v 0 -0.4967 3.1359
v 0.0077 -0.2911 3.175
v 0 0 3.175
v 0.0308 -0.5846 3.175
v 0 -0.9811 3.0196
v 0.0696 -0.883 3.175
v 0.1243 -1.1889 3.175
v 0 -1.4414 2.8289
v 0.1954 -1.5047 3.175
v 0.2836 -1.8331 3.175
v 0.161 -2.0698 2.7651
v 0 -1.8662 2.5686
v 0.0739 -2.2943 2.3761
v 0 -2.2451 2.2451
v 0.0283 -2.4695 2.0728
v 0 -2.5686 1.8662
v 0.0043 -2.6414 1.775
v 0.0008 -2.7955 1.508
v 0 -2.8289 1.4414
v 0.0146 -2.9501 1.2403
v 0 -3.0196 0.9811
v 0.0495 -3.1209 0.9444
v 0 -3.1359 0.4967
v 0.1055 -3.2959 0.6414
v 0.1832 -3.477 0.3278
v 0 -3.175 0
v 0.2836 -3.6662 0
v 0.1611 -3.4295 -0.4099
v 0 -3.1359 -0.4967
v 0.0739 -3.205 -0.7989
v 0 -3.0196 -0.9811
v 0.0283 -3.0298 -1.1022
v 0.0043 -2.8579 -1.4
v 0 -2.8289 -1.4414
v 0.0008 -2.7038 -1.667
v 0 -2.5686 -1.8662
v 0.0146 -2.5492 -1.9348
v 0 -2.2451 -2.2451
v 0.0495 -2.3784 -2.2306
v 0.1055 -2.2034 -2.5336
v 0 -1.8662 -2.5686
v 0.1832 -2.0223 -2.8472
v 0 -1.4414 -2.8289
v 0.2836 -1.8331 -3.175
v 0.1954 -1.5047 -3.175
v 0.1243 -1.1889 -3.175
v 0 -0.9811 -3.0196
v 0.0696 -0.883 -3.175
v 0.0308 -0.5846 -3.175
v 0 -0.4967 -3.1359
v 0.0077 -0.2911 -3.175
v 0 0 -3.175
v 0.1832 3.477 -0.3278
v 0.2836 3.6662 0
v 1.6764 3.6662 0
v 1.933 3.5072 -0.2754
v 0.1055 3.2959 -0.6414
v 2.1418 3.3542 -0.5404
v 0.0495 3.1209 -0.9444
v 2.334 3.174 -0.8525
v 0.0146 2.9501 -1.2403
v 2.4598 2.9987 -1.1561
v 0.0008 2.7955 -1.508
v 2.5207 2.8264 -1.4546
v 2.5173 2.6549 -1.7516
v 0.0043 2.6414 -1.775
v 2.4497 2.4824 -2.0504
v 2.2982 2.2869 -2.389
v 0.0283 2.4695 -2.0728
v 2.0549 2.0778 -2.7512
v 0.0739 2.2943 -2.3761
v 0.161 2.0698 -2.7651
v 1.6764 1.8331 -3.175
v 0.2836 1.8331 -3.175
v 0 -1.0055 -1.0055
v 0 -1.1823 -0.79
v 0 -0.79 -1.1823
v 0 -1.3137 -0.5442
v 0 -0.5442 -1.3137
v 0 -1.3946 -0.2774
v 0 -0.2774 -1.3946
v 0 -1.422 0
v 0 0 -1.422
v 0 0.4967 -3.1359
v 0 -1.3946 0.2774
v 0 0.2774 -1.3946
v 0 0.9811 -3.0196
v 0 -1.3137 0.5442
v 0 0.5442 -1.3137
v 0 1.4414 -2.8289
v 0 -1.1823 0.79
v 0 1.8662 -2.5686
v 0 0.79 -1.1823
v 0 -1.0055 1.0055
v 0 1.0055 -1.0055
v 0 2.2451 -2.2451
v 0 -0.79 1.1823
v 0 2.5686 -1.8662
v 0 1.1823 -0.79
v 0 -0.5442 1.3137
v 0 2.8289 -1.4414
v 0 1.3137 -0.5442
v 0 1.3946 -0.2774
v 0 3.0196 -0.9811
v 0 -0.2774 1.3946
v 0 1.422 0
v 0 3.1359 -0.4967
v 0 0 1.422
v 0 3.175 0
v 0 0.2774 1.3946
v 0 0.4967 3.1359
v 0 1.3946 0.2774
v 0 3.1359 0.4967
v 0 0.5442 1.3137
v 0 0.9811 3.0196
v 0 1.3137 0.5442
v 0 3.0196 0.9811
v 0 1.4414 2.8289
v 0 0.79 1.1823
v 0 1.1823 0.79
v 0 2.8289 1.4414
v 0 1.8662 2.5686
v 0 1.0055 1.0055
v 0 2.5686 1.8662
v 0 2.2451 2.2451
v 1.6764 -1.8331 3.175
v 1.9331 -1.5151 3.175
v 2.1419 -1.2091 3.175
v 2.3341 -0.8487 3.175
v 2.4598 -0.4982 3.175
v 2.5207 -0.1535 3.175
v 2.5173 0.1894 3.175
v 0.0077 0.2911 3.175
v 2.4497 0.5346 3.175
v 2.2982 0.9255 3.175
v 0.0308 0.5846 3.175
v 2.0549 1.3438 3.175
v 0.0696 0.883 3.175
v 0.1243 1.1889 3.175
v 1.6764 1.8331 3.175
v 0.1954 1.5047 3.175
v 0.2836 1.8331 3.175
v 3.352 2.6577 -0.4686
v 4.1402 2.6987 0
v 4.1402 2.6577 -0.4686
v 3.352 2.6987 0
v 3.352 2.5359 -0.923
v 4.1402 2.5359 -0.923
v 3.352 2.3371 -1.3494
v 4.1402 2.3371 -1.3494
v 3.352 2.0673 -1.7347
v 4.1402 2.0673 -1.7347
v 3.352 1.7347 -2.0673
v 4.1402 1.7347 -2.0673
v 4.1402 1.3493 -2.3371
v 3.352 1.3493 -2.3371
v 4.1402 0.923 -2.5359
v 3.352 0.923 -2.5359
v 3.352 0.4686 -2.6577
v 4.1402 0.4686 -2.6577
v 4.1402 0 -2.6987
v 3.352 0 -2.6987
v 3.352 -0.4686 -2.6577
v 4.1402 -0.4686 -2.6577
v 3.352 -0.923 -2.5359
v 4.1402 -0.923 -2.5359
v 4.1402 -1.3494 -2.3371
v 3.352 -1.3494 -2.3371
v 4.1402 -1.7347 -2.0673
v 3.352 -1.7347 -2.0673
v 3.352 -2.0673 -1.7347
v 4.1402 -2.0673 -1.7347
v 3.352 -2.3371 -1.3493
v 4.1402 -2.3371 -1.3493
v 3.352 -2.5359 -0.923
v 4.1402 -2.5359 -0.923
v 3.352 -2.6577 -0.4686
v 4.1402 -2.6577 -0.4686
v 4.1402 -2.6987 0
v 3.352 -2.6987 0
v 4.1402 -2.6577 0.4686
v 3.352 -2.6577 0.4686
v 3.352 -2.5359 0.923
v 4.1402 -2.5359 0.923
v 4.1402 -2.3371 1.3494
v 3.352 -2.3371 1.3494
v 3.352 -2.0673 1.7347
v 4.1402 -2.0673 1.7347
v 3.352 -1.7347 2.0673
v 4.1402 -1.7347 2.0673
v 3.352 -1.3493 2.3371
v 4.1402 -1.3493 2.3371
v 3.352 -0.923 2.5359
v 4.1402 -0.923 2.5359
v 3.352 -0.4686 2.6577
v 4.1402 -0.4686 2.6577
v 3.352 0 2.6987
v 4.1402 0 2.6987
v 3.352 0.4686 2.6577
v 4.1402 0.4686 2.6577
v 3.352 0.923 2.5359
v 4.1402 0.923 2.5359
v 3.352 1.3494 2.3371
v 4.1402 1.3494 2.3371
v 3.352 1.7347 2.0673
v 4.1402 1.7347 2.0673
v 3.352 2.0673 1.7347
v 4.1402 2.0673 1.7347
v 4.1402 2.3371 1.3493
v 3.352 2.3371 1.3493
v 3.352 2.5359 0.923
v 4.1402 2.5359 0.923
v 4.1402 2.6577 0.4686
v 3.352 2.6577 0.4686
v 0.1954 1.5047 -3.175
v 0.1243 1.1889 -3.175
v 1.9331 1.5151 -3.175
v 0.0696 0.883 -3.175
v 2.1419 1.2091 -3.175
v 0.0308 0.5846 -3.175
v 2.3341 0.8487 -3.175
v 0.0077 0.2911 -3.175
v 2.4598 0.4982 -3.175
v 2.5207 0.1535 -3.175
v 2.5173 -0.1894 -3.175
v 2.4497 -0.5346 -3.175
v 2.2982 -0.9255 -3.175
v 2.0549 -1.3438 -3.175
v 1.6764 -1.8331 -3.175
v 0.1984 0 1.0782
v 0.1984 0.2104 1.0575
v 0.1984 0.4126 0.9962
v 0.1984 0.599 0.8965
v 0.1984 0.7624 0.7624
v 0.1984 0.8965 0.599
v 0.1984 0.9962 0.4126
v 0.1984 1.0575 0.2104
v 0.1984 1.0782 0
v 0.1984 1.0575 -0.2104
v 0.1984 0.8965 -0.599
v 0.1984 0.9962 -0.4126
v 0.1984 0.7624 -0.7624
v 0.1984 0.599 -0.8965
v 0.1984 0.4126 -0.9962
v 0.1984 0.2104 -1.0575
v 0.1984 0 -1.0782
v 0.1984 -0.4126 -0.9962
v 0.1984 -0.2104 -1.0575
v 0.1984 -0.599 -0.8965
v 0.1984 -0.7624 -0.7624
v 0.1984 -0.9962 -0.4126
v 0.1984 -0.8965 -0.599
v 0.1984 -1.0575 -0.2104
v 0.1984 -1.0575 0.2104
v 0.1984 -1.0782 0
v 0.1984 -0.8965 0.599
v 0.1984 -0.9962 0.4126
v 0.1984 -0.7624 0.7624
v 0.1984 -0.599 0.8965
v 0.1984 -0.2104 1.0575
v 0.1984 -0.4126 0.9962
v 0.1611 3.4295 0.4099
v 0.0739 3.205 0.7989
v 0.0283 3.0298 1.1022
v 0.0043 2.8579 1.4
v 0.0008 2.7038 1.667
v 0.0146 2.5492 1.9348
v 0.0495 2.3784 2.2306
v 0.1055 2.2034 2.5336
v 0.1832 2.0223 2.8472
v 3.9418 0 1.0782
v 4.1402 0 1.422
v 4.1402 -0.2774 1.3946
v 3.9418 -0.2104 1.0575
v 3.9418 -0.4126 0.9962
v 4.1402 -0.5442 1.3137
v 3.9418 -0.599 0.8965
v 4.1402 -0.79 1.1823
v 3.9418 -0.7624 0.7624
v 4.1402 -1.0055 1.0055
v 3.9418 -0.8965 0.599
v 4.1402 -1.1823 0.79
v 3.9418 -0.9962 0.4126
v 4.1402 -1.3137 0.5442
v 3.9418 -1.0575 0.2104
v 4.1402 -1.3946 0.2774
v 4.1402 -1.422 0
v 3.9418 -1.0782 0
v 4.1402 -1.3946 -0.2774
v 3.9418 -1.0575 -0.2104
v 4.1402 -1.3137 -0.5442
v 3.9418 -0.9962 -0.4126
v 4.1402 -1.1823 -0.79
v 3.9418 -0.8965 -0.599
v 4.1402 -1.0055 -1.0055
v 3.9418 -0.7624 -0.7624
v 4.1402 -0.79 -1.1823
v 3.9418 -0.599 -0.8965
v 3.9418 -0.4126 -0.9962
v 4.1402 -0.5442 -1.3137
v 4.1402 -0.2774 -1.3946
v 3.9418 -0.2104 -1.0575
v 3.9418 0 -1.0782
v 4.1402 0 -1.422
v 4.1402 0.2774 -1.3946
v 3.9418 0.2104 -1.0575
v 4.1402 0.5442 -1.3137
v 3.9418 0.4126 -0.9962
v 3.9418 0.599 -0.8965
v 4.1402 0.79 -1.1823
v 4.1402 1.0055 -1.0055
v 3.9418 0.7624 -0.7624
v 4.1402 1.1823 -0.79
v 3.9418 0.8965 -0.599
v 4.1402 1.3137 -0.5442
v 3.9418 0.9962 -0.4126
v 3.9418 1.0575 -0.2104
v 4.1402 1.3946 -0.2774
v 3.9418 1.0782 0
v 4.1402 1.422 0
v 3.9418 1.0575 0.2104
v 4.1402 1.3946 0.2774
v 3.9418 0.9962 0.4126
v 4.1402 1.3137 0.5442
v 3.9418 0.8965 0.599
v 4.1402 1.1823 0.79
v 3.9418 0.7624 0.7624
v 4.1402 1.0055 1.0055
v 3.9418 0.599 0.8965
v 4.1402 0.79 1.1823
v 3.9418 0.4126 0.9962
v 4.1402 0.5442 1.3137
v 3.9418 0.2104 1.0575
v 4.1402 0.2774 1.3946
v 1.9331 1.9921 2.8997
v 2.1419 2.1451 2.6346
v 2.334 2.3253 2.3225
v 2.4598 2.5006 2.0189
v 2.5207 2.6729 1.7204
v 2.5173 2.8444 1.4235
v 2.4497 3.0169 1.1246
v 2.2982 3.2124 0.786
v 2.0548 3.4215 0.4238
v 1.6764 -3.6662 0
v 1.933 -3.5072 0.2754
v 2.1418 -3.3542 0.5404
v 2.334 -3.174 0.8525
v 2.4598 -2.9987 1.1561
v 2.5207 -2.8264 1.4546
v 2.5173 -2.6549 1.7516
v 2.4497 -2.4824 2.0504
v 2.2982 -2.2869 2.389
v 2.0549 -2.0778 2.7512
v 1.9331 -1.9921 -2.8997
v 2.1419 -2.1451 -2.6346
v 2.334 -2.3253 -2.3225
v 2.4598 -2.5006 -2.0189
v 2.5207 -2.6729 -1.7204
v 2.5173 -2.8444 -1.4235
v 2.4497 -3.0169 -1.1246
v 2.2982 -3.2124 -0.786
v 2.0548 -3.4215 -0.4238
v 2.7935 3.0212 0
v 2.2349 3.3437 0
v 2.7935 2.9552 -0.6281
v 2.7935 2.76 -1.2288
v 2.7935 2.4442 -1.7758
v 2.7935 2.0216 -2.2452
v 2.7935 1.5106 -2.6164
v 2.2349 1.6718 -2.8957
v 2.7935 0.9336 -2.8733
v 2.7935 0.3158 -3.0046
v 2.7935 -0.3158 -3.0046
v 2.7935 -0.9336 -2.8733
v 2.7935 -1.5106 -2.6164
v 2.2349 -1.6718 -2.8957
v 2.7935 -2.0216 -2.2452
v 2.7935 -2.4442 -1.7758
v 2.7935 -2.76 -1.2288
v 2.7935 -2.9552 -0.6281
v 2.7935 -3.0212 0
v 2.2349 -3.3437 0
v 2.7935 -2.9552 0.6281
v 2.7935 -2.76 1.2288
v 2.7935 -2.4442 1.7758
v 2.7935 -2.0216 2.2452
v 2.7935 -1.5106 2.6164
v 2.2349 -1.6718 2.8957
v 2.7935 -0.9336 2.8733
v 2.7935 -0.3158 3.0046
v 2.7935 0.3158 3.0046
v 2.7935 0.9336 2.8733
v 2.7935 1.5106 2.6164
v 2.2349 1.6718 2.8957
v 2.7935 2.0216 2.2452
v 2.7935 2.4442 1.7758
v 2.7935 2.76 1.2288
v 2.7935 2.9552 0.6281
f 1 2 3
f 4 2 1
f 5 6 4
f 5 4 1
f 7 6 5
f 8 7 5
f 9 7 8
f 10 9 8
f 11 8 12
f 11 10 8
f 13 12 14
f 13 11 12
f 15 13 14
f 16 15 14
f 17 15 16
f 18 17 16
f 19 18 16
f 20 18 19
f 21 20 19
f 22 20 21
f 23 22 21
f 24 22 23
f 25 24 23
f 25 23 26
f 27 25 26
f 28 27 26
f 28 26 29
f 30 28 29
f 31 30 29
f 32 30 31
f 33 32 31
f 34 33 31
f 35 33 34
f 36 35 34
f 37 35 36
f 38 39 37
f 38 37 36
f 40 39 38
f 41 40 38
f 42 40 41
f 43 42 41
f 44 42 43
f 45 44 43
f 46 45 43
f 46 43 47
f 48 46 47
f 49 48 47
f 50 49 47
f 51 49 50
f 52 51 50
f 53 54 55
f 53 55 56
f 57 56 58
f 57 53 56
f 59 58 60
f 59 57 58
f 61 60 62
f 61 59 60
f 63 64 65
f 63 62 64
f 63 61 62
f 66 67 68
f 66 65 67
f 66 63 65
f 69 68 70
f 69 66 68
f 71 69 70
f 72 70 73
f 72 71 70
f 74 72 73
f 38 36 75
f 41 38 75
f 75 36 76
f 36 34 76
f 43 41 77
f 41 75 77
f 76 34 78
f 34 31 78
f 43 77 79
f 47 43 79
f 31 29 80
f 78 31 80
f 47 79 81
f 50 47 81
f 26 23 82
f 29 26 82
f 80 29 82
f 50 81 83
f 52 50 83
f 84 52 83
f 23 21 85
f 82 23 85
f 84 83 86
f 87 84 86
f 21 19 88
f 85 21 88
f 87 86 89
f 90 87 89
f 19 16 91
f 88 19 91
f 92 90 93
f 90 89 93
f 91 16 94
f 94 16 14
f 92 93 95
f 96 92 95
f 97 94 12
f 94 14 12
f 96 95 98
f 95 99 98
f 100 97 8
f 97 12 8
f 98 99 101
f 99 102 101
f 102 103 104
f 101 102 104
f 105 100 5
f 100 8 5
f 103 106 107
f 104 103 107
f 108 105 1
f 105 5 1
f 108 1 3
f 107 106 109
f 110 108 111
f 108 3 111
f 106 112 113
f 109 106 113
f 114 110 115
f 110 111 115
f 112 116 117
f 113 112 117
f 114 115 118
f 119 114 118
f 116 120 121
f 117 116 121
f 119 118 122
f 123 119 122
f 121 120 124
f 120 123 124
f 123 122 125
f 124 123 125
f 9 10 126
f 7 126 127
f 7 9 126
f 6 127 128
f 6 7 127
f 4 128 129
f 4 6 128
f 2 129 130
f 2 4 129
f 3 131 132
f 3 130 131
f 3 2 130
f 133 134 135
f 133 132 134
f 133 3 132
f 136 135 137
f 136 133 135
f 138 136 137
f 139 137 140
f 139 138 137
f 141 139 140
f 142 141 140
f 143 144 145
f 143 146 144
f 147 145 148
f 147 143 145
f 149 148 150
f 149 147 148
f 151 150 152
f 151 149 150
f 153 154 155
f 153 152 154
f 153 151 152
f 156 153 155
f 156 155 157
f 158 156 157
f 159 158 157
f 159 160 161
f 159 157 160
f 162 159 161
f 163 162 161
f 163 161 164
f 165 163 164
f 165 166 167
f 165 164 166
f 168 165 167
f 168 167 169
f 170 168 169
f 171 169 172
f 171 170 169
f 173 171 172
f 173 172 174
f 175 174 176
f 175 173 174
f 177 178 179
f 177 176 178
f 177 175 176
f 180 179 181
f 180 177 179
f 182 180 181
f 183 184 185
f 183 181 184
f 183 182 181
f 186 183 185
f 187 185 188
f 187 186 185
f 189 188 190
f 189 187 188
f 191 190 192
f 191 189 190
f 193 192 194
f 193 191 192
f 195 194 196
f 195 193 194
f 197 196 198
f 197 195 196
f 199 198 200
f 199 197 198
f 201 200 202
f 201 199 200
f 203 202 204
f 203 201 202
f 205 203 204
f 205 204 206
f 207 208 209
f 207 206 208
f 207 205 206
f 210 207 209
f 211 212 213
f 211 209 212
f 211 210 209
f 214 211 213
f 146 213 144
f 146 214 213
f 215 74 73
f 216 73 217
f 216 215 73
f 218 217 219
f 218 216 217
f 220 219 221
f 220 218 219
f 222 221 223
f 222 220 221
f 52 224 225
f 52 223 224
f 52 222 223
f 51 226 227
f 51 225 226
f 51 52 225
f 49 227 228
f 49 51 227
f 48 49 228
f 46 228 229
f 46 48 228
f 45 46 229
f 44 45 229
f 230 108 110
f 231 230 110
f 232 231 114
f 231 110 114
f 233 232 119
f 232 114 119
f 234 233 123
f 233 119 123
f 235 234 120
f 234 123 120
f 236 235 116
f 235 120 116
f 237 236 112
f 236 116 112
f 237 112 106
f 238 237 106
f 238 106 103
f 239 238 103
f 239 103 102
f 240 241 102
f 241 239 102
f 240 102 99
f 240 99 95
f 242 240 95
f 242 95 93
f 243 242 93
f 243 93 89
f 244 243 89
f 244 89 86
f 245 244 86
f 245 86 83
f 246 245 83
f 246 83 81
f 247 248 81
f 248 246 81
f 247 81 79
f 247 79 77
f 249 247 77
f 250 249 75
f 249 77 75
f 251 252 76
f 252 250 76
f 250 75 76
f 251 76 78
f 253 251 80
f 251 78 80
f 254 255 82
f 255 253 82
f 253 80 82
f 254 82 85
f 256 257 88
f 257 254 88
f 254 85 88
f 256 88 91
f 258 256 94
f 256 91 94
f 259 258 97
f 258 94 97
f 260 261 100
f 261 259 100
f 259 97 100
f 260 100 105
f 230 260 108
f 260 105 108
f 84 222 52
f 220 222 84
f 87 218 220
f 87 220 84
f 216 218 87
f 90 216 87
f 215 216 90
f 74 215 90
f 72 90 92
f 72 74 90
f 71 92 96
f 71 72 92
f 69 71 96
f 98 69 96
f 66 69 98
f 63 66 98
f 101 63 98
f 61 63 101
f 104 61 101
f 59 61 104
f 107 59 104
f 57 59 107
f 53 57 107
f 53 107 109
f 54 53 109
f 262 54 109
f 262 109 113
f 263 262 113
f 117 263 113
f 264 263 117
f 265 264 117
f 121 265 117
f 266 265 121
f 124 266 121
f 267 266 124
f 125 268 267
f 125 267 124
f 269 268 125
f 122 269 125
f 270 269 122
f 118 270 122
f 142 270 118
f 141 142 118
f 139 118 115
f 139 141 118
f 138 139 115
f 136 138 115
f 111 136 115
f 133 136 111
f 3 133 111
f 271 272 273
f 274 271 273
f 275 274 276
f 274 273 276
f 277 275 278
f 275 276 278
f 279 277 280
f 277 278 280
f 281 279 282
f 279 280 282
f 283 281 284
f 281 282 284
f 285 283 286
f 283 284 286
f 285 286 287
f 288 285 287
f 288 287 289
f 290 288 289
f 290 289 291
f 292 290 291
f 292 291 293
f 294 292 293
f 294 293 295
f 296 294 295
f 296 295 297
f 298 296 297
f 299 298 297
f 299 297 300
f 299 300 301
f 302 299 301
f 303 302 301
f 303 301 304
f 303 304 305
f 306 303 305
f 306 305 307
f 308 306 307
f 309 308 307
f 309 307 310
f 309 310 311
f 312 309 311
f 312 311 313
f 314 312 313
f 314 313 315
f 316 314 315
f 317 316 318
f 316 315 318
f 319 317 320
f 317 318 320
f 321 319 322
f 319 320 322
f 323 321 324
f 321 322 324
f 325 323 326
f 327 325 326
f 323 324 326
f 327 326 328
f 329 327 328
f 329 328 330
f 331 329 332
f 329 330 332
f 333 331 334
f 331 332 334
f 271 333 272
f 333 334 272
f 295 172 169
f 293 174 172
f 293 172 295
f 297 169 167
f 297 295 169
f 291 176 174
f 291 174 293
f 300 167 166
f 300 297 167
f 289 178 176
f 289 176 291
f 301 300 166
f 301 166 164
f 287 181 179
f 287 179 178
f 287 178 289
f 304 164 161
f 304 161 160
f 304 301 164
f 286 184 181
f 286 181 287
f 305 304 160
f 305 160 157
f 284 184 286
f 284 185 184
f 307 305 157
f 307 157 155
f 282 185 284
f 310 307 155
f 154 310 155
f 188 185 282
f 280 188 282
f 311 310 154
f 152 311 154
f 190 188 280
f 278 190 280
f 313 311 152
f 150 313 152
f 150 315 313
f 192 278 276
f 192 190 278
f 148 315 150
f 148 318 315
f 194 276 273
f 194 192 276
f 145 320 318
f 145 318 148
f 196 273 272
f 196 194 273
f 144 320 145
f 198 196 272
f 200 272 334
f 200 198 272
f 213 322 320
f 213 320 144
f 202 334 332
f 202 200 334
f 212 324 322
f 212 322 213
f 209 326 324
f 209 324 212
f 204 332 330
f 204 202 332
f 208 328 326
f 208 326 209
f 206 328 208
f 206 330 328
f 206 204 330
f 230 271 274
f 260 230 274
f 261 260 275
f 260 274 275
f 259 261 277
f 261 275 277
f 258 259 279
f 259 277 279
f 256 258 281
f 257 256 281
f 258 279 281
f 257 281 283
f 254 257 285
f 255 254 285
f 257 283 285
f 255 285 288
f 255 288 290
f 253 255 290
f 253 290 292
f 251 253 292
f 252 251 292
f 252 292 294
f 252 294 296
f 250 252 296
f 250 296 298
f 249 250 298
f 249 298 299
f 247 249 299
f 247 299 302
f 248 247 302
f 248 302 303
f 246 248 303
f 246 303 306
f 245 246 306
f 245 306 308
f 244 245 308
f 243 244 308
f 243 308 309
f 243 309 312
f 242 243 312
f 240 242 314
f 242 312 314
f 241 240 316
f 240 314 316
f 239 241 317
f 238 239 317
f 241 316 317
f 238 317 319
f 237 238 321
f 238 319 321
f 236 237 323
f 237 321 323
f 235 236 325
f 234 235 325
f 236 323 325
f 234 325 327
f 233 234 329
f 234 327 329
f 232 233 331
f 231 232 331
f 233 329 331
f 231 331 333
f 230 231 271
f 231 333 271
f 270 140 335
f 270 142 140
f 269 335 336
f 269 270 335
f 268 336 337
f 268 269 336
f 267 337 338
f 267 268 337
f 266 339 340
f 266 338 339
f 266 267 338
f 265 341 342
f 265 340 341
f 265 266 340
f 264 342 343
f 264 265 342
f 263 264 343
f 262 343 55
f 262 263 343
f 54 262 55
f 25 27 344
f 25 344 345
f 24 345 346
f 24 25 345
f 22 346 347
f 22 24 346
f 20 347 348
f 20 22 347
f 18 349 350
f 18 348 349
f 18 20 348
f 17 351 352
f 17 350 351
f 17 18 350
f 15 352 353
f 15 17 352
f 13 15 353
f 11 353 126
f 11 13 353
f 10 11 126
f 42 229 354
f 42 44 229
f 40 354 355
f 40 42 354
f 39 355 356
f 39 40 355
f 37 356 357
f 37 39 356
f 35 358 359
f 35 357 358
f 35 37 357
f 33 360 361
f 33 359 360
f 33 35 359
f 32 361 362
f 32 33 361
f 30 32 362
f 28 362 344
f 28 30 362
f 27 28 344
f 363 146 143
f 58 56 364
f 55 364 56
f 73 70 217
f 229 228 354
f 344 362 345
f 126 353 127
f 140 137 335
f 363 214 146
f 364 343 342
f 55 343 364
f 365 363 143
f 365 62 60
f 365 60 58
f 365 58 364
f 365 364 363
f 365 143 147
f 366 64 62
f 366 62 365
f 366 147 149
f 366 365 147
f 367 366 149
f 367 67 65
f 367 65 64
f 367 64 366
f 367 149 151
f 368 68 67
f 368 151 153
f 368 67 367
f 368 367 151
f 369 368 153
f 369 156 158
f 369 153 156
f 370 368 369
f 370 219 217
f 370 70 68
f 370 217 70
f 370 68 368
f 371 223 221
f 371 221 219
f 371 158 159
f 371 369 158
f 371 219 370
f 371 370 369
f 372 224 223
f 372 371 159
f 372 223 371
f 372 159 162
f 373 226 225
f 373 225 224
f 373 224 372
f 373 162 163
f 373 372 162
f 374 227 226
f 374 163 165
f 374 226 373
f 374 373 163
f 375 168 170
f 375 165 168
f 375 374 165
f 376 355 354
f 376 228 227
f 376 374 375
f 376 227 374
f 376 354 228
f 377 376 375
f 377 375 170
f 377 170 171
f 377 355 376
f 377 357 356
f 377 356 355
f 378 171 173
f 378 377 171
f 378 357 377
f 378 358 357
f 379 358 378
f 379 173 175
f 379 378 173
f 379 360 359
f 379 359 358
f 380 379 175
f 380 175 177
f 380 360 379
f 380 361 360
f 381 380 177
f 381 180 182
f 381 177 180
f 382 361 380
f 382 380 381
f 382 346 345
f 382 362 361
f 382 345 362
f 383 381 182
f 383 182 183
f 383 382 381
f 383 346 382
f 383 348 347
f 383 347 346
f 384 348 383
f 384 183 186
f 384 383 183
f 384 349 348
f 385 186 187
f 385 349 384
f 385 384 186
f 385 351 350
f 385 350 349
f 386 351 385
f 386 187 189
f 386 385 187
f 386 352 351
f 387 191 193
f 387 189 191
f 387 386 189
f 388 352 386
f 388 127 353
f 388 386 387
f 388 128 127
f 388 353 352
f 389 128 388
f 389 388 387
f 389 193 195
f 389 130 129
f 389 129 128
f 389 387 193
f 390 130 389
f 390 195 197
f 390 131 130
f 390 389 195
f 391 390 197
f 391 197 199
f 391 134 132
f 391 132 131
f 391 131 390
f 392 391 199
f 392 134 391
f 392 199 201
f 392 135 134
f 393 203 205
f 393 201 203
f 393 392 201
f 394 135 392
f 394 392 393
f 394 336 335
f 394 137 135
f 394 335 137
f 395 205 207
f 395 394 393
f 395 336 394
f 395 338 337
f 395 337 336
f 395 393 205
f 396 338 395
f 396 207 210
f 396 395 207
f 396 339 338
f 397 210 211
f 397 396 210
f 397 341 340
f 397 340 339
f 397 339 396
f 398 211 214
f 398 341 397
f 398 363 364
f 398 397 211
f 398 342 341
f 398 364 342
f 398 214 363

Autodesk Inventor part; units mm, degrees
ref_plane "YZ Plane" through (0, 0, 0) normal (1, 0, 0) x (0, 1, 0)
ref_plane "XZ Plane" through (0, 0, 0) normal (0, 1, 0) x (-1, 0, 0)
sketch "Sketch1" plane through (0, 0, 0) normal (1, 0, 0) x (0, 1, 0)
  line L0 (-3.6662, 0) -> (-1.8331, 3.175)
  line L1 (-1.8331, 3.175) -> (1.8331, 3.175)
  line L2 (1.8331, 3.175) -> (3.6662, 0)
  line L3 (3.6662, 0) -> (1.8331, -3.175)
  line L4 (1.8331, -3.175) -> (-1.8331, -3.175)
  line L5 (-1.8331, -3.175) -> (-3.6662, 0)
  point P0 (0, 0)
  point P1 (0, 0)
  dimension "d0" = 7.3323
extrude "Body" add sketch "Sketch1" along normal blind 4.1402
sketch "Sketch2" plane through (0, 0, 0) normal (-1, 0, 0) x (0, 0, 1)
  line L0 (0, -5.1326) -> (0, 5.1326) projected
  line L1 (-4.445, 0) -> (4.445, 0) projected
  point P0 (0, 0)
hole "Thread" at (0, 0, 0) direction (1, 0, 0) diameter 2.1565 end through all thread size "4-40 UNC" class "2B" standard "ANSI Unified Screw Threads"
chamfer "Chamfer1" distance 0.3437 angle 30 1 edges at (0, 0, -1.0782) measured on face at (0, -2.1289, -1.2625)
chamfer "Chamfer2" distance 0.3437 angle 30 1 edges at (4.1402, 0, -1.0782) measured on face at (4.1402, -2.1289, -1.2625)
sketch "Sketch3" plane through (0, 0, 0) normal (0, 0, 1) x (1, 0, 0)
  line L0 (0, 1.8331) -> (0, 3.6662) projected
  line L1 (0, 3.6662) -> (4.1402, 3.6662) projected
  line L2 (4.1402, 1.8331) -> (4.1402, 3.6662) projected
  line L3 (-0.828, 0) -> (4.9682, 0) projected
  line L4 (0.2836, 3.6662) -> (0, 3.175)
  line L5 (4.1402, 2.6987) -> (3.352, 2.6987)
  line L6 (3.352, 2.6987) -> (1.6764, 3.6662)
  dimension "d3" = 30
  dimension "d5" = 6.35
  dimension "d6" = 5.3975
  dimension "d8" = 60
  dimension "d9" = 1.6764
revolve "Chamfer3" cut sketch "Sketch3" angle 360 about axis through (-10, 0, 0) along (1, 0, 0)
ref_plane "Work Plane1" through (10.5464, 0, 0) normal (0, 0, 1) x (-1, 0, 0)
equation "\"d0\" = 1.1547 * SW"
equation "\"d1\" = KOH"
equation "\"d3\" = ANG1"
equation "\"d5\" = SW0"
equation "\"d6\" = SW1"
equation "\"d8\" = ANG2"
equation "\"d9\" = KOH1"
equation "\"d10\" = -0.5 * GD1 + 0.5 * NND"
equation "\"d39\" = -0.5 * GD1 + 0.5 * NND"
equation "\"d12\" = -0.5 * GD1 + 0.5 * NND"
equation "\"d40\" = -0.5 * GD1 + 0.5 * NND"
equation "\"ANG1\" = 30deg"
equation "\"ANG2\" = 60deg"
equation "\"NND\" = 2.8448"
equation "\"KOH\" = 4.1402"
equation "\"SW\" = 6.35"
equation "\"SW0\" = SW"
equation "\"SW1\" = 0.85 * SW"
equation "\"KOH1\" = 1.6764"
equation "\"THREADDIA\" = 2.8448"
equation "\"TOA\" = 30deg"
equation "\"E0\" = 1.155 * SW"
equation "\"GD1\" = 2.157392"
properties part number "IFI 100/107 - No. 4 - 40 Metal Type" material "Steel, Mild"
